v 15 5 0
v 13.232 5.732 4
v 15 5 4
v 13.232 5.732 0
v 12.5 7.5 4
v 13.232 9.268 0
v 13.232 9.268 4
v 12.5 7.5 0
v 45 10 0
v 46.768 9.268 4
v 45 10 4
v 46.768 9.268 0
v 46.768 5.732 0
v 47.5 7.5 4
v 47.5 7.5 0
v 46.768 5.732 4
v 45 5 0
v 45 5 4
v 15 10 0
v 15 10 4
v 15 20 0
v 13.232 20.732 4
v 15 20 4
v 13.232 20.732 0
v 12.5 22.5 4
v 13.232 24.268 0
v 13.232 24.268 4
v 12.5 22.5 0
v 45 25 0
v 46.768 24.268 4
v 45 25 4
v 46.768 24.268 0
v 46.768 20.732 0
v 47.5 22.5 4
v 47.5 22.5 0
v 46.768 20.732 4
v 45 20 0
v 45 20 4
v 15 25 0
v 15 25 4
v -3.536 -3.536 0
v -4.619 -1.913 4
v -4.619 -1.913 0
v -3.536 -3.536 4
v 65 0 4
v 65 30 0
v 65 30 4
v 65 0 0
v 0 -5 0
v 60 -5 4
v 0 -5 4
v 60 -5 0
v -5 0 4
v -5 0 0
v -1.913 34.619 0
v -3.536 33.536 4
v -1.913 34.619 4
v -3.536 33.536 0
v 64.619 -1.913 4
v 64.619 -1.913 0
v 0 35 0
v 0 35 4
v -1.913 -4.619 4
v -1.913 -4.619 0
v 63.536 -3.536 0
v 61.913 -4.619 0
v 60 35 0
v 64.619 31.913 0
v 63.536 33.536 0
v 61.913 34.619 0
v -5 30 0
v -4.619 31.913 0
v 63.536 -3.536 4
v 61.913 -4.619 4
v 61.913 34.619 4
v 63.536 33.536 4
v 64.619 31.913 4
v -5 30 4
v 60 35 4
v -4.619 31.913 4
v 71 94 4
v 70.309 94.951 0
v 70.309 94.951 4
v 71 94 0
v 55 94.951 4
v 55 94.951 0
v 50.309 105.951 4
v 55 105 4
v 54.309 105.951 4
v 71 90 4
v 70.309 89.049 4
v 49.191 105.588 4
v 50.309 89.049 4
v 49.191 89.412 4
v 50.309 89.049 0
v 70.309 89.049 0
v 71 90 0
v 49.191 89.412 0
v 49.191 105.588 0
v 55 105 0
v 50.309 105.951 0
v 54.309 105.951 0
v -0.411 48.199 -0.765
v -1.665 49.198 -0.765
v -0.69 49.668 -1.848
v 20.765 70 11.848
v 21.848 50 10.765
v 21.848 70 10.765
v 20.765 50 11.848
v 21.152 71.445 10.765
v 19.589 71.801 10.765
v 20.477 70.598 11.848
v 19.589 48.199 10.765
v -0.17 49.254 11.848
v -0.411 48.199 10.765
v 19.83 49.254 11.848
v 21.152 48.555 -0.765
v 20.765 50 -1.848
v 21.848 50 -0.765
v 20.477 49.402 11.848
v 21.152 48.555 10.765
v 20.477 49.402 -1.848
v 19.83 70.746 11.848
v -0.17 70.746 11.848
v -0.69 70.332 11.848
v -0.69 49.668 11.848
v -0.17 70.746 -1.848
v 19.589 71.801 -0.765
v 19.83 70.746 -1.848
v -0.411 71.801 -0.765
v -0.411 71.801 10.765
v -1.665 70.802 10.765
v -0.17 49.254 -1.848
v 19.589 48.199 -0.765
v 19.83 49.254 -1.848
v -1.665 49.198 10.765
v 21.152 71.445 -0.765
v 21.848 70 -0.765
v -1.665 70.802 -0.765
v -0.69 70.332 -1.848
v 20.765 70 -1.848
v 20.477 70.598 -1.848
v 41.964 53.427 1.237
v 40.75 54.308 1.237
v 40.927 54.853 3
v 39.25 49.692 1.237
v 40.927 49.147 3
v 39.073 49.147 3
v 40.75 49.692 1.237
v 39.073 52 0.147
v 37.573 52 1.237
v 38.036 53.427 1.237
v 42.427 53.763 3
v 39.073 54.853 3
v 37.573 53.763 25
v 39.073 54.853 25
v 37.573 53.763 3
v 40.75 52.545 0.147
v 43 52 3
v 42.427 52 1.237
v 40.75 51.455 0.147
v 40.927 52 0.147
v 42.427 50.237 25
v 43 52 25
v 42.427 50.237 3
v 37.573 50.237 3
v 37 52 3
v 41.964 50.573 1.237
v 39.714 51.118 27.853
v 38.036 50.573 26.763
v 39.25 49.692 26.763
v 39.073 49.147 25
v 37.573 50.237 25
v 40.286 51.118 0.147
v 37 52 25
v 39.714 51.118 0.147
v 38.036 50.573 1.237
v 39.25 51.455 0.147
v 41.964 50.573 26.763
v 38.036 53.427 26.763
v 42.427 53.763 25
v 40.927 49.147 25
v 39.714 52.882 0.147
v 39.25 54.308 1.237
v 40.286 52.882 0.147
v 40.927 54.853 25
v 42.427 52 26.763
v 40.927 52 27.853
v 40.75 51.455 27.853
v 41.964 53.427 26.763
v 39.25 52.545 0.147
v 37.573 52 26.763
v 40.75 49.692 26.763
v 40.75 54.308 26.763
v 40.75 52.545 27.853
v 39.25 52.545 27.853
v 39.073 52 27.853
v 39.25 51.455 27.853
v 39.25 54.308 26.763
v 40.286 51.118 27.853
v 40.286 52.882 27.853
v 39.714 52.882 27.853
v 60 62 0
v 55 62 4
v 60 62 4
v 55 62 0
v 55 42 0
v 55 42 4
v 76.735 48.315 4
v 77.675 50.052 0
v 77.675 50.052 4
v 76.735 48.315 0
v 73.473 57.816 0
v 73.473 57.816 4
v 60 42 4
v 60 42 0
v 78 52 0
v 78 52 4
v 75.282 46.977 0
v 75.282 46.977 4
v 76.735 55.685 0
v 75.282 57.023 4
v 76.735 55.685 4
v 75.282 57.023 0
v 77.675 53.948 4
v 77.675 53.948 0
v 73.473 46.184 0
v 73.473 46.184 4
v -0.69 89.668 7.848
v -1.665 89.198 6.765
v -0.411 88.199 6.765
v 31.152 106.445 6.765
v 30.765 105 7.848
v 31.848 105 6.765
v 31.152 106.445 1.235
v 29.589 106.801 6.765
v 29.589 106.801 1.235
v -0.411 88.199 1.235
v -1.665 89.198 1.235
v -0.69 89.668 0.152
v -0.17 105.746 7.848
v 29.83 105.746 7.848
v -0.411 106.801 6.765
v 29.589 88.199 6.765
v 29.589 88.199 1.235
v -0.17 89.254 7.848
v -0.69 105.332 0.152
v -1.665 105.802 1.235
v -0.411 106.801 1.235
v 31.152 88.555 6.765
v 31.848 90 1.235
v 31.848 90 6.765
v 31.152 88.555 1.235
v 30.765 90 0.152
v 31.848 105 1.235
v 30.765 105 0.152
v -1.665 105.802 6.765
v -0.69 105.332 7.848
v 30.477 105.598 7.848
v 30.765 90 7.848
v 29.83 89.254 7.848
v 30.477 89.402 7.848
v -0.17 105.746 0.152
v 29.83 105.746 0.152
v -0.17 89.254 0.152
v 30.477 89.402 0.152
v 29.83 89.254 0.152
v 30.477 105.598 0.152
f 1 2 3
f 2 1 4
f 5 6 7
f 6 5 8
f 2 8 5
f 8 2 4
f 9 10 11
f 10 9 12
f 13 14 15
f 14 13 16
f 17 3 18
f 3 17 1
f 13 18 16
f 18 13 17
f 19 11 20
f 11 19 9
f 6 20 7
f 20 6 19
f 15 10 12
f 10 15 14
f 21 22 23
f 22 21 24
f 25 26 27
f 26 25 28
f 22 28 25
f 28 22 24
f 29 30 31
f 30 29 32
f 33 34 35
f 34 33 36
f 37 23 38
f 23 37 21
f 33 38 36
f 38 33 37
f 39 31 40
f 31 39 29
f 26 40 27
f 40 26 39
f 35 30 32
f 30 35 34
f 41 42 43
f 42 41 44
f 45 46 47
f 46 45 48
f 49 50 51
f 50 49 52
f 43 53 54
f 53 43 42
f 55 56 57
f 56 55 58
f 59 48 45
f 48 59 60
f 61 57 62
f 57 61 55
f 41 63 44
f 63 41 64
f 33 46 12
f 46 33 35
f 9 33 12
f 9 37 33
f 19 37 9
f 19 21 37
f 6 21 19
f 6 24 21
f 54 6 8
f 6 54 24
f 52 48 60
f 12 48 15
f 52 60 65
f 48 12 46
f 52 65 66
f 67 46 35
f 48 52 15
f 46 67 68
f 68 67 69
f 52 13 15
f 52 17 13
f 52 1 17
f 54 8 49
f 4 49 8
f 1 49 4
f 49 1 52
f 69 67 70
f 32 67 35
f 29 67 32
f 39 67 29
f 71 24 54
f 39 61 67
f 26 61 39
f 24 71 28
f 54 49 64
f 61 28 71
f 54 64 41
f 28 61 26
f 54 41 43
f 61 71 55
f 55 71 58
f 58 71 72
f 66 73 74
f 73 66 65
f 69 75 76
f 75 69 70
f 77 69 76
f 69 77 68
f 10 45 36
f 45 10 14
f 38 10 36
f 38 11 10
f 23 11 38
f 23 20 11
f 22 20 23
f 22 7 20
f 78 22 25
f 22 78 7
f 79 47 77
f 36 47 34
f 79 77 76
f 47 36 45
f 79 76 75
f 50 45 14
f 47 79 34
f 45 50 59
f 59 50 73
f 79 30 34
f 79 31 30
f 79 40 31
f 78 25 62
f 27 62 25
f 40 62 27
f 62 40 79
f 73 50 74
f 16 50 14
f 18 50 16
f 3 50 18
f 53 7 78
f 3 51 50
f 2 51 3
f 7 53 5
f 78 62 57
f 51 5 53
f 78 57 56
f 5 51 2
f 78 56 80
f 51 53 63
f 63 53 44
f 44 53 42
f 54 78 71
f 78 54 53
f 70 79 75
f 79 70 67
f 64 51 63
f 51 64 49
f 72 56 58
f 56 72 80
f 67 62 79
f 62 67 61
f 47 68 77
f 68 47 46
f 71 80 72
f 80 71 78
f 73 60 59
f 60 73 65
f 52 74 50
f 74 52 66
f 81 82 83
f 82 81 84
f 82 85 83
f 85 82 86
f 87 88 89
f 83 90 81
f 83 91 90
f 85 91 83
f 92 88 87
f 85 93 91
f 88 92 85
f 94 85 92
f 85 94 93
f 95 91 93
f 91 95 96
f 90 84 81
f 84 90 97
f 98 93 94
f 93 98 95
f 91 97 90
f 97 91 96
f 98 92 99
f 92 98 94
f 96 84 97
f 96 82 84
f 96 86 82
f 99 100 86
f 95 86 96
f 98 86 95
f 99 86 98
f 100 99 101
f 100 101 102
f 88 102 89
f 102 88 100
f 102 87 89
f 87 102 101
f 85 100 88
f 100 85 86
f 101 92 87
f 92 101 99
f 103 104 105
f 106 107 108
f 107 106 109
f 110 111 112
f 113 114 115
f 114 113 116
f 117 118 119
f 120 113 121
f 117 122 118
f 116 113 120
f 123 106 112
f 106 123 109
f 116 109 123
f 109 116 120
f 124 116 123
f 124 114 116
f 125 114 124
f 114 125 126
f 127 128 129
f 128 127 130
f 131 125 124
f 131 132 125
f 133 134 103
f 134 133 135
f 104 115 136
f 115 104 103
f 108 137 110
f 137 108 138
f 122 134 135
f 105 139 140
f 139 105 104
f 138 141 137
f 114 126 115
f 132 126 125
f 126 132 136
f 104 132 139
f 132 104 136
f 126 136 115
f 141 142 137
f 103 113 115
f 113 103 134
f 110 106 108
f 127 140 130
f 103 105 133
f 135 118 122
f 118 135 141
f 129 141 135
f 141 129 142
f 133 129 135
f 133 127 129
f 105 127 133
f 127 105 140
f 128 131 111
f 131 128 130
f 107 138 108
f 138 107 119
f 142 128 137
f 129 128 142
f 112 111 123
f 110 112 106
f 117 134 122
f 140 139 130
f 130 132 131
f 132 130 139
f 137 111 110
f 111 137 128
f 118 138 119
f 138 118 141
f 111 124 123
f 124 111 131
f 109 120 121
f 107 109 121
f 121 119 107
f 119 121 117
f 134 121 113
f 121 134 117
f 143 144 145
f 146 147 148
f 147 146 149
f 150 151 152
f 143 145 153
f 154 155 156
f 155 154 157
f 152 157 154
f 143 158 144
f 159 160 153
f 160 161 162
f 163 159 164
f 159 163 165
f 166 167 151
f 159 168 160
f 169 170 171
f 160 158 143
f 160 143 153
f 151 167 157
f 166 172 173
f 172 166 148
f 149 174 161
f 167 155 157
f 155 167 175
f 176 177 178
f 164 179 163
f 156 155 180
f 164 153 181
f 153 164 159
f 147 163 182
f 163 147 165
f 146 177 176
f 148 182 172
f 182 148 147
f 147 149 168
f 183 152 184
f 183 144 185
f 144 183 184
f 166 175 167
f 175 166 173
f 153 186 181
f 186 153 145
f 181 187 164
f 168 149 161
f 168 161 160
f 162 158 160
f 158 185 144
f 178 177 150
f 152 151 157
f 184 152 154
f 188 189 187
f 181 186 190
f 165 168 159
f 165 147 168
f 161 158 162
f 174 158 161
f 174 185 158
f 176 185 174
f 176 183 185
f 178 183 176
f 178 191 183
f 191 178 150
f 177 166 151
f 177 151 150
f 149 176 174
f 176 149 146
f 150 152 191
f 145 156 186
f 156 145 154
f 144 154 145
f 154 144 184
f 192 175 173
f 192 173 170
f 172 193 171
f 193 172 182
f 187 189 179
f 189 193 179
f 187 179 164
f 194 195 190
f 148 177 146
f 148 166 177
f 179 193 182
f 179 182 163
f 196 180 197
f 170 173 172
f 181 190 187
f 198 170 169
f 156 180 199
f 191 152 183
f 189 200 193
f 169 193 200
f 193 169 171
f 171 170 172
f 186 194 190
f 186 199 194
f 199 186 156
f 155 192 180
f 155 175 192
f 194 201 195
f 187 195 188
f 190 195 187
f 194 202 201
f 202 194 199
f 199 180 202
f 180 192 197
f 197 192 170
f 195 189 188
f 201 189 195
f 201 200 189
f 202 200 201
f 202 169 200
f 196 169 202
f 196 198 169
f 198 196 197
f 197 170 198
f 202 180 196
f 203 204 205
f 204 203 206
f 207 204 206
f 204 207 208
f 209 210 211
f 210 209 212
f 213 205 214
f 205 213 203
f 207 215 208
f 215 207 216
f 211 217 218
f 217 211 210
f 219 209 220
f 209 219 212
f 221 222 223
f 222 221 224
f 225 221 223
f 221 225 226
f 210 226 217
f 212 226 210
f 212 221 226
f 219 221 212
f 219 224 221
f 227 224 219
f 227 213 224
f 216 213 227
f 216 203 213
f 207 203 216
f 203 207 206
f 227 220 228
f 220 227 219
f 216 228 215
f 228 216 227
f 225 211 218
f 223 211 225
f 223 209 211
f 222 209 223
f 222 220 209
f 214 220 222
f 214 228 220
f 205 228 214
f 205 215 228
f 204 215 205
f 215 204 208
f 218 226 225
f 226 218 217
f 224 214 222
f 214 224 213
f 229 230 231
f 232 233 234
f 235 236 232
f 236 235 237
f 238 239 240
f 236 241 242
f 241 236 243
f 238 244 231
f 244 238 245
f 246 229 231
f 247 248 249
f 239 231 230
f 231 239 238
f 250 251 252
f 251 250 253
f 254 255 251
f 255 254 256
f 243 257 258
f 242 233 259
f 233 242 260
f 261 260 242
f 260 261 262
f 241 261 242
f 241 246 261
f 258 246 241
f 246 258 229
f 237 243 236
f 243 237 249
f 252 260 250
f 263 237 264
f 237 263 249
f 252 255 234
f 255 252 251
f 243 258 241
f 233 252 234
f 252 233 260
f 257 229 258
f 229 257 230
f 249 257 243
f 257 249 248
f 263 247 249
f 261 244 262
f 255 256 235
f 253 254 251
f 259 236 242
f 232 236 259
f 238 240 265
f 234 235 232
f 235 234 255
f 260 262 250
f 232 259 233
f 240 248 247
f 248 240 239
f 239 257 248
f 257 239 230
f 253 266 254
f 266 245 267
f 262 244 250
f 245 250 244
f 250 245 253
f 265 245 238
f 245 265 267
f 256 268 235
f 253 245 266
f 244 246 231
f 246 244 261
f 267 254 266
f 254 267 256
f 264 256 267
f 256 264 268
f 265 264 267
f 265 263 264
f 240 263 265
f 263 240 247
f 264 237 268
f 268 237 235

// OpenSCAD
// Zweck: hull() und minkowski() in ihren exakten Sonderfällen (Plan 21): Platte mit runden
// Ecken und Langlöchern (2D-Hülle), abgerundeter Block (minkowski mit Kugel), Griff als Kapsel
// (Kugeln auf einer Achse), Lasche aus Quader und Zylinder gleicher Höhe (Prisma), Kissen aus
// gleich großen Kugeln (Hülle der Mittelpunkte + Offset) und eine Leiste aus linear_extrude +
// cylinder (Minkowski-Summe zweier Prismen).
module langloch(l = 20, d = 6) {
    hull() {
        circle(d = d);
        translate([l, 0]) circle(d = d);
    }
}

module platte(w = 60, t = 30, h = 4, r = 5) {
    difference() {
        linear_extrude(h) hull() {
            for (x = [0, w], y = [0, t]) translate([x, y]) circle(r);
        }
        for (y = [t / 4, 3 * t / 4]) translate([w / 4, y, -1]) linear_extrude(h + 2) langloch(w / 2, 5);
    }
}

platte();
translate([0, 50, 0]) minkowski() {
    cube([20, 20, 10]);
    sphere(2);
}
translate([40, 52, 0]) hull() {
    translate([0, 0, 3]) sphere(3);
    translate([0, 0, 25]) sphere(3);
}
translate([60, 52, 0]) hull() {
    translate([-5, -10, 0]) cube([5, 20, 4]);
    translate([12, 0, 0]) cylinder(r = 6, h = 4);
}
translate([0, 90, 2]) hull() {
    for (x = [0, 30], y = [0, 15], z = [0, 4]) translate([x, y, z]) sphere(2);
}
translate([50, 90, 0]) minkowski() {
    linear_extrude(3) polygon([[0, 0], [20, 0], [20, 4], [4, 4], [4, 15], [0, 15]]);
    cylinder(r = 1, h = 1);
}
